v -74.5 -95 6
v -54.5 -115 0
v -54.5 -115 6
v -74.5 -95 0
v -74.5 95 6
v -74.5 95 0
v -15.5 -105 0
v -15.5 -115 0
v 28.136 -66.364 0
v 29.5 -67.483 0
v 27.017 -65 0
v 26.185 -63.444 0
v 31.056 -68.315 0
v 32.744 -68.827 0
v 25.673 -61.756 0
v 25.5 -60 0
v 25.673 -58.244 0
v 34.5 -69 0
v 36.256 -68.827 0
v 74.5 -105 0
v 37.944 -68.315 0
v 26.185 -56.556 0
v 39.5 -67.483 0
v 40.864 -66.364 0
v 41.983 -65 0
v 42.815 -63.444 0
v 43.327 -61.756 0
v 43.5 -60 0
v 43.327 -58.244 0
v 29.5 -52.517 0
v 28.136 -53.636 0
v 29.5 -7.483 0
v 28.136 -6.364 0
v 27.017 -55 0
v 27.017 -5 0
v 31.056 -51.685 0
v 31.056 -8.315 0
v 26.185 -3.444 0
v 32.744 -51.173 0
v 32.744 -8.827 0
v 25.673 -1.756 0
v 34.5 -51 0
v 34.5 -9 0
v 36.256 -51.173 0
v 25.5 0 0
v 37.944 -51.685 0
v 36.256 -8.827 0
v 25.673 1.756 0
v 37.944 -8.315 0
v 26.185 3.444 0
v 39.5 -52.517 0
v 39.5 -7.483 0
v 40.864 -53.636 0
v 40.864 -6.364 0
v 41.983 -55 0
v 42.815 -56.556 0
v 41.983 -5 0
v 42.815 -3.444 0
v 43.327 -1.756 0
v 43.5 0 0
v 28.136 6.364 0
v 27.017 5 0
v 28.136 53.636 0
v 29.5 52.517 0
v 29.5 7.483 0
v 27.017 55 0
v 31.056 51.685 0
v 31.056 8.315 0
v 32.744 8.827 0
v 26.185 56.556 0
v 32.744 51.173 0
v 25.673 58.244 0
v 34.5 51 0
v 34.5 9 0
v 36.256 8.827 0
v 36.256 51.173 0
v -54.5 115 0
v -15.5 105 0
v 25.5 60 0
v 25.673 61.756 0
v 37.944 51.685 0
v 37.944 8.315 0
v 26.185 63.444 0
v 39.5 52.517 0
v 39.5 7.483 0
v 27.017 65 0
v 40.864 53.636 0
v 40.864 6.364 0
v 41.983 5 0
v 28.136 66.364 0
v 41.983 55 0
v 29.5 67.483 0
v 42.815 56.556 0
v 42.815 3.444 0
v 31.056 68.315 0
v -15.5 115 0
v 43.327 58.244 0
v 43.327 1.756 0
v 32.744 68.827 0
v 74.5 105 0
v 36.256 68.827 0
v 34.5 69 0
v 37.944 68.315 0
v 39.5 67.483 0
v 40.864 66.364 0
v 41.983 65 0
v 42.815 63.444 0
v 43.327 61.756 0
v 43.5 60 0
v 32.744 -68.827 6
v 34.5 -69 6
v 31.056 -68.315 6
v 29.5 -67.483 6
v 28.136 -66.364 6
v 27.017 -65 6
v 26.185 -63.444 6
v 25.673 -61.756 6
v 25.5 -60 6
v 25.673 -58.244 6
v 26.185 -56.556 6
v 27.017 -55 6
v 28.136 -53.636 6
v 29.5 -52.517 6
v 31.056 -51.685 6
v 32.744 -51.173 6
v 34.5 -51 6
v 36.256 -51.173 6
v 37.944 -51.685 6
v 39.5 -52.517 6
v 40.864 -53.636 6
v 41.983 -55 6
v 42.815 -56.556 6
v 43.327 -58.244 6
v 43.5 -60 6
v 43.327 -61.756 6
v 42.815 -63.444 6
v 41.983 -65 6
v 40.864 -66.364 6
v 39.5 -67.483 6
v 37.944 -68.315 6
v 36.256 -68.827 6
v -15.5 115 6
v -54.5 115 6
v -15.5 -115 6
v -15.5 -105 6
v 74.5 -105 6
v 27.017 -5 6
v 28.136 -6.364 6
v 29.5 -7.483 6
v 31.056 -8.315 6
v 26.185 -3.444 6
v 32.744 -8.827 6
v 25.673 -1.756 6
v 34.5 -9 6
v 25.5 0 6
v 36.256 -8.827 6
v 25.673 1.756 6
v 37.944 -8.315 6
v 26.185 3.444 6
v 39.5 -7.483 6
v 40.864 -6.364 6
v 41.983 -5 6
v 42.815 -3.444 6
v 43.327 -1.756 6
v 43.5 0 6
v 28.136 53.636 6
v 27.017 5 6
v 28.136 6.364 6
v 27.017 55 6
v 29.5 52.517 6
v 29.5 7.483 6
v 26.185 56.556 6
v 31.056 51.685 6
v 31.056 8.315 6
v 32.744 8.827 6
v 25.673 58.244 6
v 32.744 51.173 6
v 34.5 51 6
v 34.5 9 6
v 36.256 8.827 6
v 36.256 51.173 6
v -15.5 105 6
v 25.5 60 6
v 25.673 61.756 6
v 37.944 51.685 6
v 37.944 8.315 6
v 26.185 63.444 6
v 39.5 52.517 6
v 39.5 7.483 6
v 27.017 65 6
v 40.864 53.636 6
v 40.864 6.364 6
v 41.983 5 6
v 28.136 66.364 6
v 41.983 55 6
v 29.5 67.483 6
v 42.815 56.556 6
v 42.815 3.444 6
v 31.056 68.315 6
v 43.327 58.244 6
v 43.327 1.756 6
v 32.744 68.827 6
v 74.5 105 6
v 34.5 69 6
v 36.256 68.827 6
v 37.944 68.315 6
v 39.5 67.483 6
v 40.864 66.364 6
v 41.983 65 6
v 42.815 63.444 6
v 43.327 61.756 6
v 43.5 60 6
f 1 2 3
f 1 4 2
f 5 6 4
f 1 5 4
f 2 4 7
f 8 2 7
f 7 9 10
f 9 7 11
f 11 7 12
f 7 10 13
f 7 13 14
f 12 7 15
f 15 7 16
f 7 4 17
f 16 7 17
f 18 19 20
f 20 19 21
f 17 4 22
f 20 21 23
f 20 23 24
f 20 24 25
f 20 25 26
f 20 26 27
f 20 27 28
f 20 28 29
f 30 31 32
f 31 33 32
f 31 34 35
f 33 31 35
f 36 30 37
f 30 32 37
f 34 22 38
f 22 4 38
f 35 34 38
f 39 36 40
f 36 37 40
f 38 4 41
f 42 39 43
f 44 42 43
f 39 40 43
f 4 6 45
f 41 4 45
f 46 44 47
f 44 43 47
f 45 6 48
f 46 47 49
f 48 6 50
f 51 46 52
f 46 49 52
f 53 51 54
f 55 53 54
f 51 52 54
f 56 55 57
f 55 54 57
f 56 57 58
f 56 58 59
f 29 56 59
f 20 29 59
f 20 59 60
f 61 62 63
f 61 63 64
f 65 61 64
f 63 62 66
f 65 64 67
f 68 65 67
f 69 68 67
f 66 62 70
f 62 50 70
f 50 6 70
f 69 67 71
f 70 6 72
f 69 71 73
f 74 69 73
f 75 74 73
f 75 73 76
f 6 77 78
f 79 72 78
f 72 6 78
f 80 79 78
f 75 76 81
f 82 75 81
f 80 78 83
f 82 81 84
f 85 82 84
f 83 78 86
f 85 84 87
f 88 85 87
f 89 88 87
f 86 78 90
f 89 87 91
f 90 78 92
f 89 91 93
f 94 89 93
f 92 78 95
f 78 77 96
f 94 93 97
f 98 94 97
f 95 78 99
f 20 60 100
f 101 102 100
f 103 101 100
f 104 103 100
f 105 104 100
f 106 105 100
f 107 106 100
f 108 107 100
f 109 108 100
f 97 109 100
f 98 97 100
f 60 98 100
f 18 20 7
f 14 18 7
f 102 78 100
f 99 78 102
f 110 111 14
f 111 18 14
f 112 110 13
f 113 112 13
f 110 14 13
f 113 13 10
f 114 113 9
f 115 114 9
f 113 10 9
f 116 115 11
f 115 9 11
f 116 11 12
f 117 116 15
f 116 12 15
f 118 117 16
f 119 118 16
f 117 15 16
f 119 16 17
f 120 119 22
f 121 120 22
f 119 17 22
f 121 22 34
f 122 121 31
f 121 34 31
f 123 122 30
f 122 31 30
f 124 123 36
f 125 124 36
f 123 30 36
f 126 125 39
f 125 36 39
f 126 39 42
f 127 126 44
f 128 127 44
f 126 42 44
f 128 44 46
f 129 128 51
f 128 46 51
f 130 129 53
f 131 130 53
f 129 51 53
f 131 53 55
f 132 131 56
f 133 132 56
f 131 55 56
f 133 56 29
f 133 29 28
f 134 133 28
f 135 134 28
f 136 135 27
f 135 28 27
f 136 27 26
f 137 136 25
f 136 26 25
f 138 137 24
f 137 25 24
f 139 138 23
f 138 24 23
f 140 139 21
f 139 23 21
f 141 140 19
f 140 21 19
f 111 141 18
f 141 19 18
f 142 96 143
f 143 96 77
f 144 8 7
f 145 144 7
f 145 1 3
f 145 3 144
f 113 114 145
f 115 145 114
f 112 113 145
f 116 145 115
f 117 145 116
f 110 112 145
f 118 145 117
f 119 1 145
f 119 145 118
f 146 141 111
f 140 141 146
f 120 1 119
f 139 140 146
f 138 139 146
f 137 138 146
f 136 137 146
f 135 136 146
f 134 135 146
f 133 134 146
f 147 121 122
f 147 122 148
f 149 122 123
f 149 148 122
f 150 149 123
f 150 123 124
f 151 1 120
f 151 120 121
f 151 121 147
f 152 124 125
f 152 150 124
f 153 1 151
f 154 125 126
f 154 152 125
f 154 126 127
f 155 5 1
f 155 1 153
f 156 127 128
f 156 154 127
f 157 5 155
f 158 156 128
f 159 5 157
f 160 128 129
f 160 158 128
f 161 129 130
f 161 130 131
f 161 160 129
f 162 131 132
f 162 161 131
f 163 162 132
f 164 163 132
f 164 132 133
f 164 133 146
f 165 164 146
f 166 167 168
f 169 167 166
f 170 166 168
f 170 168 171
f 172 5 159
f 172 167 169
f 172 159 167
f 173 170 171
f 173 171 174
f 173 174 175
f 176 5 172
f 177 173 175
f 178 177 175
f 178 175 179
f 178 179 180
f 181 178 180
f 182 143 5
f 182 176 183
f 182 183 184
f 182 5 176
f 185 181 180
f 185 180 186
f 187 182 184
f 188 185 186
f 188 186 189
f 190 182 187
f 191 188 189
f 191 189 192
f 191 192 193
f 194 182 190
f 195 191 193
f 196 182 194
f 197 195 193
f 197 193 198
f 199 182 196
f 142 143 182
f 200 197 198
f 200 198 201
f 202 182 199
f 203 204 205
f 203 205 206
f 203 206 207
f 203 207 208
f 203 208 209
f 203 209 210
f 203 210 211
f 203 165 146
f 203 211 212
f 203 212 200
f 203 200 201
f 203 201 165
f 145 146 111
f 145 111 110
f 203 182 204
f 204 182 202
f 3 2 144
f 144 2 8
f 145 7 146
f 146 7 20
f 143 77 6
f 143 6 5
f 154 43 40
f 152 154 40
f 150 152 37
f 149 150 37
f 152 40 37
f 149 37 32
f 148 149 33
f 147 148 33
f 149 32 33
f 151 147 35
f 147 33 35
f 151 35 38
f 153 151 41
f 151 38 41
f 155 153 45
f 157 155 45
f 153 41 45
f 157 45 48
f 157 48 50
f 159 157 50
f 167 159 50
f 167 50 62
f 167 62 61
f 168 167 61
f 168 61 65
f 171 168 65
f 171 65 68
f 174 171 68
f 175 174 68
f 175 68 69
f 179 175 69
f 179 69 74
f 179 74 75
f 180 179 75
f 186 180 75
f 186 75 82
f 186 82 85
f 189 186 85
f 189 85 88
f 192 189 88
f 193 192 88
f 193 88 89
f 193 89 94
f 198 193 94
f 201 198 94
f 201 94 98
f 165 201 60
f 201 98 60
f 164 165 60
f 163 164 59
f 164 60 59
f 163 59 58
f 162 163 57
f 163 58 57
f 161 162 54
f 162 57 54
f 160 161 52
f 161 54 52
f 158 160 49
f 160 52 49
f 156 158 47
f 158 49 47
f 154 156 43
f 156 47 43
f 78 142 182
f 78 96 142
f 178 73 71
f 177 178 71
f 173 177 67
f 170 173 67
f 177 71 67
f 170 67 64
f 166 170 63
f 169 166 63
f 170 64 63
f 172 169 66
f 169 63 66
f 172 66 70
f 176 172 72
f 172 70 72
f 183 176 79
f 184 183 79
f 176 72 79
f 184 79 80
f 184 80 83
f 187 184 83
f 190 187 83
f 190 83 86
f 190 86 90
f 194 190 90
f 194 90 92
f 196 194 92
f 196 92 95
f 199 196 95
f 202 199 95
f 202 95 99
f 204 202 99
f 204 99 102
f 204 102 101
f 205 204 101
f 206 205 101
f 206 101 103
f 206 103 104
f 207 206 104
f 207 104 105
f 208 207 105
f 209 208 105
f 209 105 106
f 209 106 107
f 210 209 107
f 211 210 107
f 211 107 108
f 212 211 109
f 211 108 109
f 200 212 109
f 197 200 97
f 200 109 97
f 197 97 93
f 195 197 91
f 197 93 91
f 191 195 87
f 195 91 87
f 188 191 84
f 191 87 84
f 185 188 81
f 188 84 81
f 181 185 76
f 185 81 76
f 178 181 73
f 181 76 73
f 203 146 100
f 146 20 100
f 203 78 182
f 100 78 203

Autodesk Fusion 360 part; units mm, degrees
sketch "スケッチ1" plane through (0, 0, 0) normal (0, 0, 1) x (1, 0, 0)
  line L0 (-15.5, 115) -> (-74.5, 115)
  line L1 (-74.5, 115) -> (-74.5, -115)
  line L2 (-74.5, -115) -> (-15.5, -115)
  line L3 (74.5, -105) -> (74.5, 105)
  line L4 (68.0217, 105) -> (-74.5, -115) construction
  line L5 (-74.5, 115) -> (68.0217, -105) construction
  line L6 (-15.5, 115) -> (-15.5, 105)
  line L7 (-15.5, 105) -> (74.5, 105)
  line L8 (-15.5, -115) -> (-15.5, -105)
  line L9 (-15.5, -105) -> (74.5, -105)
  dimension "d2" = 230
extrude "押し出し1" add sketch "スケッチ1" along normal blind 6
chamfer "面取り1" distance 20 angle 45 2 edges at (-74.5, -115, 3) (-74.5, 115, 3)
sketch "スケッチ2" plane through (0, 0, 6) normal (0, 0, 1) x (-1, 0, 0)
  line L0 (54.5, -115) -> (74.5, -95)
  line L1 (74.5, -95) -> (74.5, 95)
  line L2 (74.5, 95) -> (54.5, 115)
  line L3 (54.5, 115) -> (15.5, 115)
  line L4 (15.5, 115) -> (15.5, 105)
  line L5 (15.5, 105) -> (-74.5, 105)
  line L6 (-74.5, 105) -> (-74.5, -105)
  line L7 (-74.5, -105) -> (15.5, -105)
  line L8 (15.5, -105) -> (15.5, -115)
  line L9 (15.5, -115) -> (54.5, -115)
  line L10 (-74.5, -105) -> (-34.5, -105)
  line L11 (-34.5, -105) -> (-34.5, -60)
  line L12 (-34.5, -60) -> (-74.5, -60)
  line L13 (-74.5, -60) -> (-74.5, -105)
  line L14 (-34.5, -60) -> (-34.5, 0)
  line L15 (-34.5, 0) -> (-34.5, 60)
  point P0 (-34.5, -60)
  point P1 (-34.5, 0)
  point P2 (-34.5, 60)
  dimension "d10" = 40
  dimension "d11" = 45
  dimension "d12" = 60
  dimension "d13" = 60
hole "穴1" at (34.5, 60, 6) at (34.5, 0, 6) at (34.5, -60, 6) direction (0, 0, -1) diameter 18 end through all
